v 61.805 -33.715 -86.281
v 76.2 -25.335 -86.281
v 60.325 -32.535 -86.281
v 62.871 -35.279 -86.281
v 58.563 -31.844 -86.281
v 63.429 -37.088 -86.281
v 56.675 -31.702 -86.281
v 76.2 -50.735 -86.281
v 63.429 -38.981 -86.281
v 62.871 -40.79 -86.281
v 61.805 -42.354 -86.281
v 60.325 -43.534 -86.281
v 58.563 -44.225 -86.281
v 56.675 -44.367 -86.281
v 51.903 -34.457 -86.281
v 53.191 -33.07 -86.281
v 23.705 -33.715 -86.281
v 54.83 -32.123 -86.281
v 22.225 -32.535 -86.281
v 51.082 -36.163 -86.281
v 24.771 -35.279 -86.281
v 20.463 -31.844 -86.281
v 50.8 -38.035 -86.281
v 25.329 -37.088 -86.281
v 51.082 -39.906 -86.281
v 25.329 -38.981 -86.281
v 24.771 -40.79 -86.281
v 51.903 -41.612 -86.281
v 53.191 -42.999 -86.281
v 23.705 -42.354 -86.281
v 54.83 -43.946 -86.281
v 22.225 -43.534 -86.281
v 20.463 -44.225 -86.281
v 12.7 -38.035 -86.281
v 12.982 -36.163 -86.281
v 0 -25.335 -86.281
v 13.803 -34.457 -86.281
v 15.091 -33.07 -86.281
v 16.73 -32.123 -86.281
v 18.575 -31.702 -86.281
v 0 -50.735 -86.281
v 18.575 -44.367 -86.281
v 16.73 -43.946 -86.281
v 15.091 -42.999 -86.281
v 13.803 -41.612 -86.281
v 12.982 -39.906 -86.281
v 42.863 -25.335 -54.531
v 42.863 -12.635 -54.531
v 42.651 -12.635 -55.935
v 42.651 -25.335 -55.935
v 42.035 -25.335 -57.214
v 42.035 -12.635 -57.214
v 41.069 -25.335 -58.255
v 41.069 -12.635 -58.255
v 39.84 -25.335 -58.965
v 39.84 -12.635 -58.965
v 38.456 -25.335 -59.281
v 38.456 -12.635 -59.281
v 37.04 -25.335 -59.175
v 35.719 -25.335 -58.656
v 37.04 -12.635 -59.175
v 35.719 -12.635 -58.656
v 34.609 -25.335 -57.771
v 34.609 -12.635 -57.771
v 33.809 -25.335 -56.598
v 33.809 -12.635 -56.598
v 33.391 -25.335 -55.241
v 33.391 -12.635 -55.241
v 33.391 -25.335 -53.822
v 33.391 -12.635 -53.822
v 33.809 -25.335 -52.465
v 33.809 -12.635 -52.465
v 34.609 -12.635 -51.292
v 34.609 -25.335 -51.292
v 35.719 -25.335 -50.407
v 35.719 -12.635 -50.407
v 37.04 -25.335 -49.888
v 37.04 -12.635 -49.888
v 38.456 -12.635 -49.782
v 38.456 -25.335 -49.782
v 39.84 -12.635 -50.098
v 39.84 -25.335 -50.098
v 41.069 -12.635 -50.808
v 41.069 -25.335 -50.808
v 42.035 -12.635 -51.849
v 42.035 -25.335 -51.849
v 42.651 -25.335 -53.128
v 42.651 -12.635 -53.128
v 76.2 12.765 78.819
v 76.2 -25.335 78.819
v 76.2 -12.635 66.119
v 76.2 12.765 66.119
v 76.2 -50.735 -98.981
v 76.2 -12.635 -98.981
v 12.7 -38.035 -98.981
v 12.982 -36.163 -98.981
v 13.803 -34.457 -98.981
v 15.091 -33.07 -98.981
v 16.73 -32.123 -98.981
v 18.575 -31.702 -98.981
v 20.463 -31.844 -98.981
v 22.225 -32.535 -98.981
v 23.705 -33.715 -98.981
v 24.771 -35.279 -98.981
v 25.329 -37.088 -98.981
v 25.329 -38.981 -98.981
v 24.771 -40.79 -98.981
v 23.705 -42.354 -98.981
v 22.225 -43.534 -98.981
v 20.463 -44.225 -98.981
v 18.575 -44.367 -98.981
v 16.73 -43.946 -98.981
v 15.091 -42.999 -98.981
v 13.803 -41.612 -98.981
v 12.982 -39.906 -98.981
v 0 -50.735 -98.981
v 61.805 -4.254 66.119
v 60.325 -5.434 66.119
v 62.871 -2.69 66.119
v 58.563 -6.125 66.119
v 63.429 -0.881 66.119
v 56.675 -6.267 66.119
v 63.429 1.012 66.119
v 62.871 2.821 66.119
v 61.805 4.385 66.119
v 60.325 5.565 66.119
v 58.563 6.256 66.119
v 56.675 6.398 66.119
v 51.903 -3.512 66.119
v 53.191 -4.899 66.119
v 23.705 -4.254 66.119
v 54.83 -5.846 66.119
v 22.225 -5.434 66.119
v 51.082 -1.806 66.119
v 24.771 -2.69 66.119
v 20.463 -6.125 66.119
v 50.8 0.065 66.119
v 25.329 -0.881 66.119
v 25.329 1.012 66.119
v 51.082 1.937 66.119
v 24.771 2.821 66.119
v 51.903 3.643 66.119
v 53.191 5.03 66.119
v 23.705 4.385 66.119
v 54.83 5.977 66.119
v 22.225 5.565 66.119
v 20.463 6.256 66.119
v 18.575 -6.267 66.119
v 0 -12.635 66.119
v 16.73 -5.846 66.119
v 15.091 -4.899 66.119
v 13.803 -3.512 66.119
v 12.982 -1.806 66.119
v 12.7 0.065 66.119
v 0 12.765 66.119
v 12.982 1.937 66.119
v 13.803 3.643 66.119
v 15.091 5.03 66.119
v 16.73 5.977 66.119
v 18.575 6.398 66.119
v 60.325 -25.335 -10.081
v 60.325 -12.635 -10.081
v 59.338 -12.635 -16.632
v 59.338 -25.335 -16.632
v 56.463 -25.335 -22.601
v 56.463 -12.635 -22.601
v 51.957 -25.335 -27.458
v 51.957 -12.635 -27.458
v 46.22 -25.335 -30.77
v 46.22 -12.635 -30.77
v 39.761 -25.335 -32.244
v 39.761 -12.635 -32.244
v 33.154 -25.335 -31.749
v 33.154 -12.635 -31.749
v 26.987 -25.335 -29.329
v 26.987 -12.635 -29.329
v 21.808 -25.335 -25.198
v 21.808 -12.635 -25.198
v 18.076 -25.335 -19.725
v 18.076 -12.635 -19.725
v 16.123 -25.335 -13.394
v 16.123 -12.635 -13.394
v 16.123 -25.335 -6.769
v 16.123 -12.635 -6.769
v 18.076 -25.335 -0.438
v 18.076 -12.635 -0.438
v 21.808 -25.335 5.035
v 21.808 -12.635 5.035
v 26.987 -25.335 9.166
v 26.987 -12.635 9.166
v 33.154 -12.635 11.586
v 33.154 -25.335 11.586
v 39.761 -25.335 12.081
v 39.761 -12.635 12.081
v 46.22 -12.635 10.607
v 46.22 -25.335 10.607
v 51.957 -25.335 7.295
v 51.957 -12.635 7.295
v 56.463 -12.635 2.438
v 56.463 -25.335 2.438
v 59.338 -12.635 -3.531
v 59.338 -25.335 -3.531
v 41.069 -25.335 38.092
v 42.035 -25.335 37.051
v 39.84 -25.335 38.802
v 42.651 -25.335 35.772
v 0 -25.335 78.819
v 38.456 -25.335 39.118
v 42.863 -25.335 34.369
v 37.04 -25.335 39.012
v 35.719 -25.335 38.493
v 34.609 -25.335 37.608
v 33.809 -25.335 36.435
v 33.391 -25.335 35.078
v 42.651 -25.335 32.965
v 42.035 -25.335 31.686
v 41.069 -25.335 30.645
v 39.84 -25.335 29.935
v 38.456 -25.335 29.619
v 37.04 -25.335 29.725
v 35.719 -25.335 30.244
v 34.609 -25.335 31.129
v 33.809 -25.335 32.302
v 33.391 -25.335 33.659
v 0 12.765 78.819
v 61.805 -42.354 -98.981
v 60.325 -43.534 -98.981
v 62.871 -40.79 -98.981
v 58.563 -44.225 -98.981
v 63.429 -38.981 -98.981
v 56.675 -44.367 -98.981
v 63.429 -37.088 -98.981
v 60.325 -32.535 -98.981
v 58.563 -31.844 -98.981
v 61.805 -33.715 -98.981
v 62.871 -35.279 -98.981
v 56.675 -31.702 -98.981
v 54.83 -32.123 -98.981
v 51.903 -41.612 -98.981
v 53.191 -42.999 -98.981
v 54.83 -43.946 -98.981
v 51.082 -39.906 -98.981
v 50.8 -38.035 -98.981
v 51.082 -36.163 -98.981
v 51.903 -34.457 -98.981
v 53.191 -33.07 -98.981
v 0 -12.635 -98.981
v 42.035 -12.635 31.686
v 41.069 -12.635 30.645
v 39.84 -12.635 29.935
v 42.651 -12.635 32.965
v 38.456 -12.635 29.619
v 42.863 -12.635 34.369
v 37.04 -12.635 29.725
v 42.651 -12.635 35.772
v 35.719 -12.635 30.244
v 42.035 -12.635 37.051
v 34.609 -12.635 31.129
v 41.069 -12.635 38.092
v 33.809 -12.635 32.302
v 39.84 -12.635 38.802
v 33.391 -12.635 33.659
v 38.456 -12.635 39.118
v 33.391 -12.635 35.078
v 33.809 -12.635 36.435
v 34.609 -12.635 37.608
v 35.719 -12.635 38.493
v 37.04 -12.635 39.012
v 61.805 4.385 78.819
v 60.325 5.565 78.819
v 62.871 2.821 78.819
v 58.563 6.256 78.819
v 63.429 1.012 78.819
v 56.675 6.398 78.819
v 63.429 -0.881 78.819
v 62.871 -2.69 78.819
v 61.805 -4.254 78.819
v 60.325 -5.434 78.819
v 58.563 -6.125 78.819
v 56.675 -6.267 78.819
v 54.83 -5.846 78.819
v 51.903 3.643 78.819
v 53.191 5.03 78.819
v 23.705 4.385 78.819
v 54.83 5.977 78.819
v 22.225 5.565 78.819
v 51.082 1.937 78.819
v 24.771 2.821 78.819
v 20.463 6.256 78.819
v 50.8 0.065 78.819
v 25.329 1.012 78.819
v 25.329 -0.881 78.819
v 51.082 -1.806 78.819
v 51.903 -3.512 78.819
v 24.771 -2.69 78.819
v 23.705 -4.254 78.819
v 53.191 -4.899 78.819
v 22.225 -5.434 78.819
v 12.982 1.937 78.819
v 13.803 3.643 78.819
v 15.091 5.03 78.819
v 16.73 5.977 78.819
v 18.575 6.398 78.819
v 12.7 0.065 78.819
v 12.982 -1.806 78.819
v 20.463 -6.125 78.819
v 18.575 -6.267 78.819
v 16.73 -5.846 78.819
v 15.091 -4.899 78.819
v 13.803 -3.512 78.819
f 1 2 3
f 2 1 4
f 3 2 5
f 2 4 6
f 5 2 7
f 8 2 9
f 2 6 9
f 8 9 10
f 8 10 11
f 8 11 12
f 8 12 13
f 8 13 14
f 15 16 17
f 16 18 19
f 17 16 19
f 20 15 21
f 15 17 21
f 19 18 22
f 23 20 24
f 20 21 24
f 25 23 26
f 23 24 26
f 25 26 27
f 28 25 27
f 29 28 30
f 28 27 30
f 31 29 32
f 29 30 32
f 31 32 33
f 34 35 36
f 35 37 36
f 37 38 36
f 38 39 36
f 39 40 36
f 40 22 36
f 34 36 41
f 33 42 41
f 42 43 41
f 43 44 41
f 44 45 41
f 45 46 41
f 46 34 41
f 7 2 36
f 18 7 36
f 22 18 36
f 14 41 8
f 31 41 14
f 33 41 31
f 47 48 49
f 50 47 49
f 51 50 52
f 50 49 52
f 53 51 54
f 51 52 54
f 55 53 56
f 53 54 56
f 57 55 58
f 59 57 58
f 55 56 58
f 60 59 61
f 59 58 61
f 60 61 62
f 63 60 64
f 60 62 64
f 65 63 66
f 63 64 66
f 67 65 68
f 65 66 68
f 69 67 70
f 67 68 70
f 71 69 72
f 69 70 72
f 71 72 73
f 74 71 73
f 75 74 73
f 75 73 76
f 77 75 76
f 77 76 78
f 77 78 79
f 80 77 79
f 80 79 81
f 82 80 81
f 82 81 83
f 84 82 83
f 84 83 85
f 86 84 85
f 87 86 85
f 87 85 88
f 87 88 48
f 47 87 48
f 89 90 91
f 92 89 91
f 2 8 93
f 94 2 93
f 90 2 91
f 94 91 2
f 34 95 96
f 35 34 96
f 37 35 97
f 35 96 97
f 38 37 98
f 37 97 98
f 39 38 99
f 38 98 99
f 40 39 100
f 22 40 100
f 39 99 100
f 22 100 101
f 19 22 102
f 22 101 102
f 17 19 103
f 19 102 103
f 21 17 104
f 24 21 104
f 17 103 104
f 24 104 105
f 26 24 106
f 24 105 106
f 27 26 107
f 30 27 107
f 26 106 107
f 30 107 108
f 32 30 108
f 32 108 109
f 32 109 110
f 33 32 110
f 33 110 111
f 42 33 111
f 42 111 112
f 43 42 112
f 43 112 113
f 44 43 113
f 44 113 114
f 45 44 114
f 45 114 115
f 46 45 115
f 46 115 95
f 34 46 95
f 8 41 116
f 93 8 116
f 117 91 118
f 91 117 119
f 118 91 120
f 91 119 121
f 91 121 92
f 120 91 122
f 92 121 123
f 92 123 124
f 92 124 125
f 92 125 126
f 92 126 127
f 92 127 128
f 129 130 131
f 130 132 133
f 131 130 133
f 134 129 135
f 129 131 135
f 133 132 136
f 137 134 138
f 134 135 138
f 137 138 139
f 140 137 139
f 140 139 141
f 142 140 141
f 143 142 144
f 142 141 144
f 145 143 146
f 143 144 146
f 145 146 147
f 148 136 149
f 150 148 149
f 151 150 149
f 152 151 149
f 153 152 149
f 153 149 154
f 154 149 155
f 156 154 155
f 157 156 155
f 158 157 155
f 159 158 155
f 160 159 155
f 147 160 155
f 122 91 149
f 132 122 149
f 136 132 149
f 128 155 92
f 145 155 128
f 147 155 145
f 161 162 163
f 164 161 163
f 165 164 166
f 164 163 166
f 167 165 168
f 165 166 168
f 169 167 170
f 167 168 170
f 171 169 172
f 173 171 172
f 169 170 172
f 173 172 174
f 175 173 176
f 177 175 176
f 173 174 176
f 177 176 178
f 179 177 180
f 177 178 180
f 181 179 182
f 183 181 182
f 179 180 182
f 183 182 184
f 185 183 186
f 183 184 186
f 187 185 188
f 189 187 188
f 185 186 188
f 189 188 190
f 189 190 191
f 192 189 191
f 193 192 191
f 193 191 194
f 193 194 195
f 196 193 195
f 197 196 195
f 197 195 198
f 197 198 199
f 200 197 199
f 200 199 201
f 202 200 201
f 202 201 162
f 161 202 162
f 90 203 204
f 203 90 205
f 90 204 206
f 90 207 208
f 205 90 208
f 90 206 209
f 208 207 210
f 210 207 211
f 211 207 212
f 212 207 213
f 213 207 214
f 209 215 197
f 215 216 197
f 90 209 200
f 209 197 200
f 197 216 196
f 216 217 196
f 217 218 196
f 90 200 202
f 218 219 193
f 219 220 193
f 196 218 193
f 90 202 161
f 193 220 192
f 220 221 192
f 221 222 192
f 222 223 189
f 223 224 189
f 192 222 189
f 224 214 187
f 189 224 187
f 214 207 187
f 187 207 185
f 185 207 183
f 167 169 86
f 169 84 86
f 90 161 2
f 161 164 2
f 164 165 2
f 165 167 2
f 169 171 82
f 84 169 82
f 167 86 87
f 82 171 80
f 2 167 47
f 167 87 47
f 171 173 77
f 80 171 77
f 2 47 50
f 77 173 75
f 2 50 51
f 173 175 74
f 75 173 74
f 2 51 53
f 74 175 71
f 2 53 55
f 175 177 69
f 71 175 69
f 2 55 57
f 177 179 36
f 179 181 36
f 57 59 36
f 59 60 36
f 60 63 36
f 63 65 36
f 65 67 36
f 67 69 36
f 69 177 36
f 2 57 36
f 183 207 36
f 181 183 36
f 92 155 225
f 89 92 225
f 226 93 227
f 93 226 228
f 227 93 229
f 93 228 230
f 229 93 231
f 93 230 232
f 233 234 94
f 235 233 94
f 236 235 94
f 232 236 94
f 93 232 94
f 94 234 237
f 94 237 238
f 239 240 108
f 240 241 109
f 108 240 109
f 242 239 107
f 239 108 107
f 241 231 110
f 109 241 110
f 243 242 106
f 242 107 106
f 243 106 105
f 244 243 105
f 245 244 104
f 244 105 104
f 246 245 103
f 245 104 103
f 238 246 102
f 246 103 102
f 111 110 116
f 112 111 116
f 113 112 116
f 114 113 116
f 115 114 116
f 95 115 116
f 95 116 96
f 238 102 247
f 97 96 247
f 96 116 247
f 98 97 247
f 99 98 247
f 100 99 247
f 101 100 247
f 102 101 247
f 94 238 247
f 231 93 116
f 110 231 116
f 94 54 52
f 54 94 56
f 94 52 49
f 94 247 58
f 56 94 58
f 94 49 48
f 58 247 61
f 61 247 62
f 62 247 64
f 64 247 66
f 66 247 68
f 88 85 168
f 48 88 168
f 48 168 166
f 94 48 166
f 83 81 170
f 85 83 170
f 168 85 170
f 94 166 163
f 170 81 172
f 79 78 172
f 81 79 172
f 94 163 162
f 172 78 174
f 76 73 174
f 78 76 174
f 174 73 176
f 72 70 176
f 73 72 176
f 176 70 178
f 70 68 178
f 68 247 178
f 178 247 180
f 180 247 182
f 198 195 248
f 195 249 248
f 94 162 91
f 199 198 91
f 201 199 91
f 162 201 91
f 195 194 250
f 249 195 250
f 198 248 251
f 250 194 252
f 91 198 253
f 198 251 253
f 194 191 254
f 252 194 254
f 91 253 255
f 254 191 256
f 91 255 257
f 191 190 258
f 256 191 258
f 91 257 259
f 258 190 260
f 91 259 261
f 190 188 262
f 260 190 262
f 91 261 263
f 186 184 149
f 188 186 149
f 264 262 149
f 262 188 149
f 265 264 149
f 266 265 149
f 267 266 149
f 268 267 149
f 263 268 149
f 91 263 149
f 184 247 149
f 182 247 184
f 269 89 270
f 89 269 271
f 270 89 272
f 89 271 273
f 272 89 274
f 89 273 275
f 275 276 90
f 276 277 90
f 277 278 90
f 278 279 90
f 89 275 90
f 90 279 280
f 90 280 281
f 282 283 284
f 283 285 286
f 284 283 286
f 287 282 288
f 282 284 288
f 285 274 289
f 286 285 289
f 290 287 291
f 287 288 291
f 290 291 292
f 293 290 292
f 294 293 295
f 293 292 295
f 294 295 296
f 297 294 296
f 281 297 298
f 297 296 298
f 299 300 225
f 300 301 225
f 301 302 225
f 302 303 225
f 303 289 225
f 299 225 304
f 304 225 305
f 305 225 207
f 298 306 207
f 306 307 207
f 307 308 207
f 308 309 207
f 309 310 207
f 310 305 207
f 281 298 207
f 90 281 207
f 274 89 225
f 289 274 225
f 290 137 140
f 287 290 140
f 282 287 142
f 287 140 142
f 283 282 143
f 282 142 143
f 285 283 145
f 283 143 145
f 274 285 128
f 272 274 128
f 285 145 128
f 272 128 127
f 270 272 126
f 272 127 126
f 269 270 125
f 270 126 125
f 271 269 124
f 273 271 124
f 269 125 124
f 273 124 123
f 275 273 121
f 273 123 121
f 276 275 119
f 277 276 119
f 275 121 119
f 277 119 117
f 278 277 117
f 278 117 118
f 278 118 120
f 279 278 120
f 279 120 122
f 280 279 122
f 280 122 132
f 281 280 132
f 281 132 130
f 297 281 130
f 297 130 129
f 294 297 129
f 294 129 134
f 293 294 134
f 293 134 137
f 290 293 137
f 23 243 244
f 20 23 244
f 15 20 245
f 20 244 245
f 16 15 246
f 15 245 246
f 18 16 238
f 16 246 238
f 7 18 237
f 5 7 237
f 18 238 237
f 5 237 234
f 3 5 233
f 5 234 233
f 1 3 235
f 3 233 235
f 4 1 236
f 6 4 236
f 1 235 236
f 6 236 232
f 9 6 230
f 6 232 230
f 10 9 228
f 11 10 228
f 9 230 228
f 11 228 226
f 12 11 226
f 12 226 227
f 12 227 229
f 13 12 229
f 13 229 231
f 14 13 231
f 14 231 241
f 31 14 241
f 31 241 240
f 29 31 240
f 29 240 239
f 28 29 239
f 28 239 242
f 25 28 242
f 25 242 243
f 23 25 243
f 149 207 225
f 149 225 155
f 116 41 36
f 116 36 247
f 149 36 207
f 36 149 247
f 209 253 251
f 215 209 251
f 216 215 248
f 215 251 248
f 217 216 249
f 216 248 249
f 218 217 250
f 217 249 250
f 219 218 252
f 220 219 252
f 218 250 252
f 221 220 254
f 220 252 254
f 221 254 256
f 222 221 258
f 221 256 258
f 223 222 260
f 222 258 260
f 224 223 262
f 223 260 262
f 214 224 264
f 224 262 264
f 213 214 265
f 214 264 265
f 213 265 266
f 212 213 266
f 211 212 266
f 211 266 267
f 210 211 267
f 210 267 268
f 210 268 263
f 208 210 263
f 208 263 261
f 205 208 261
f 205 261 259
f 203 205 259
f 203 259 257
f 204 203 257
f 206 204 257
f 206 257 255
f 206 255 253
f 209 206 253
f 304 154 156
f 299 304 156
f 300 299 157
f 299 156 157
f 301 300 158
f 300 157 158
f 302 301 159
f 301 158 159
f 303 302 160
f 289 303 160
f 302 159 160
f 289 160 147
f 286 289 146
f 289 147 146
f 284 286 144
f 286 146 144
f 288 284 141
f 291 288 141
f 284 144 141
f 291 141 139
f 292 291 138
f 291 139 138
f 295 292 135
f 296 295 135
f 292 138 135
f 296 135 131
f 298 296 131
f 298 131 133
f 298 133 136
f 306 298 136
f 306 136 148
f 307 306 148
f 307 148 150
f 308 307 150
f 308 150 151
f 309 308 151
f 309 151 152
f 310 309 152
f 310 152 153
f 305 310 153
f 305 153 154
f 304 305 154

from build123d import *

# Parameters (mm, degrees)
BOSS_EXTRUDE1_DEPTH = 76.2
SKETCH3_R           = 6.35
CUT_EXTRUDE1_DEPTH  = 76.2
SKETCH4_R           = 6.35
CUT_EXTRUDE2_DEPTH  = 76.2
SKETCH5_R           = 22.225
SKETCH5_R_2         = 4.7625
CUT_EXTRUDE3_DEPTH  = 76.2


with BuildPart() as part:
    # Sketch2 → Boss-Extrude1 (new body)
    with BuildSketch(Plane(origin=(0, 0, 0), x_dir=(0, 0, -1), z_dir=(1, 0, 0))):
        Polygon((-78.818556701, -25.334536082), (86.281443299, -25.334536082), (86.281443299, -50.734536082), (98.981443299, -50.734536082), (98.981443299, -25.334536082), (98.981443299, -12.634536082), (-66.118556701, -12.634536082), (-66.118556701, 12.765463918), (-78.818556701, 12.765463918), (-78.818556701, -6.875900942), align=None)
    extrude(amount=BOSS_EXTRUDE1_DEPTH)

    # Sketch3 → Cut-Extrude1 (cut)
    with BuildSketch(Plane(origin=(0, 0, -98.981443299), x_dir=(-1, 0, 0), z_dir=(0, 0, -1))):
        with Locations((-57.15, -38.034536082)):
            Circle(SKETCH3_R)
        with Locations((-19.05, -38.034536082)):
            Circle(SKETCH3_R)
    extrude(amount=-CUT_EXTRUDE1_DEPTH, mode=Mode.SUBTRACT)

    # Sketch4 → Cut-Extrude2 (cut)
    with BuildSketch(Plane(origin=(0, 0, 66.118556701), x_dir=(-1, 0, 0), z_dir=(0, 0, -1))):
        with Locations((-57.15, 0.065463918)):
            Circle(SKETCH4_R)
        with Locations((-19.05, 0.065463918)):
            Circle(SKETCH4_R)
    extrude(amount=-CUT_EXTRUDE2_DEPTH, mode=Mode.SUBTRACT)

    # Sketch5 → Cut-Extrude3 (cut)
    with BuildSketch(Plane(origin=(0, -12.634536082, 0), x_dir=(1, 0, 0), z_dir=(0, 1, 0))):
        with Locations((38.1, 10.081443299)):
            Circle(SKETCH5_R)
        with Locations((38.1, 54.531443299)):
            Circle(SKETCH5_R_2)
        with Locations((38.1, -34.368556701)):
            Circle(SKETCH5_R_2)
    extrude(amount=-CUT_EXTRUDE3_DEPTH, mode=Mode.SUBTRACT)


solid = part.part
